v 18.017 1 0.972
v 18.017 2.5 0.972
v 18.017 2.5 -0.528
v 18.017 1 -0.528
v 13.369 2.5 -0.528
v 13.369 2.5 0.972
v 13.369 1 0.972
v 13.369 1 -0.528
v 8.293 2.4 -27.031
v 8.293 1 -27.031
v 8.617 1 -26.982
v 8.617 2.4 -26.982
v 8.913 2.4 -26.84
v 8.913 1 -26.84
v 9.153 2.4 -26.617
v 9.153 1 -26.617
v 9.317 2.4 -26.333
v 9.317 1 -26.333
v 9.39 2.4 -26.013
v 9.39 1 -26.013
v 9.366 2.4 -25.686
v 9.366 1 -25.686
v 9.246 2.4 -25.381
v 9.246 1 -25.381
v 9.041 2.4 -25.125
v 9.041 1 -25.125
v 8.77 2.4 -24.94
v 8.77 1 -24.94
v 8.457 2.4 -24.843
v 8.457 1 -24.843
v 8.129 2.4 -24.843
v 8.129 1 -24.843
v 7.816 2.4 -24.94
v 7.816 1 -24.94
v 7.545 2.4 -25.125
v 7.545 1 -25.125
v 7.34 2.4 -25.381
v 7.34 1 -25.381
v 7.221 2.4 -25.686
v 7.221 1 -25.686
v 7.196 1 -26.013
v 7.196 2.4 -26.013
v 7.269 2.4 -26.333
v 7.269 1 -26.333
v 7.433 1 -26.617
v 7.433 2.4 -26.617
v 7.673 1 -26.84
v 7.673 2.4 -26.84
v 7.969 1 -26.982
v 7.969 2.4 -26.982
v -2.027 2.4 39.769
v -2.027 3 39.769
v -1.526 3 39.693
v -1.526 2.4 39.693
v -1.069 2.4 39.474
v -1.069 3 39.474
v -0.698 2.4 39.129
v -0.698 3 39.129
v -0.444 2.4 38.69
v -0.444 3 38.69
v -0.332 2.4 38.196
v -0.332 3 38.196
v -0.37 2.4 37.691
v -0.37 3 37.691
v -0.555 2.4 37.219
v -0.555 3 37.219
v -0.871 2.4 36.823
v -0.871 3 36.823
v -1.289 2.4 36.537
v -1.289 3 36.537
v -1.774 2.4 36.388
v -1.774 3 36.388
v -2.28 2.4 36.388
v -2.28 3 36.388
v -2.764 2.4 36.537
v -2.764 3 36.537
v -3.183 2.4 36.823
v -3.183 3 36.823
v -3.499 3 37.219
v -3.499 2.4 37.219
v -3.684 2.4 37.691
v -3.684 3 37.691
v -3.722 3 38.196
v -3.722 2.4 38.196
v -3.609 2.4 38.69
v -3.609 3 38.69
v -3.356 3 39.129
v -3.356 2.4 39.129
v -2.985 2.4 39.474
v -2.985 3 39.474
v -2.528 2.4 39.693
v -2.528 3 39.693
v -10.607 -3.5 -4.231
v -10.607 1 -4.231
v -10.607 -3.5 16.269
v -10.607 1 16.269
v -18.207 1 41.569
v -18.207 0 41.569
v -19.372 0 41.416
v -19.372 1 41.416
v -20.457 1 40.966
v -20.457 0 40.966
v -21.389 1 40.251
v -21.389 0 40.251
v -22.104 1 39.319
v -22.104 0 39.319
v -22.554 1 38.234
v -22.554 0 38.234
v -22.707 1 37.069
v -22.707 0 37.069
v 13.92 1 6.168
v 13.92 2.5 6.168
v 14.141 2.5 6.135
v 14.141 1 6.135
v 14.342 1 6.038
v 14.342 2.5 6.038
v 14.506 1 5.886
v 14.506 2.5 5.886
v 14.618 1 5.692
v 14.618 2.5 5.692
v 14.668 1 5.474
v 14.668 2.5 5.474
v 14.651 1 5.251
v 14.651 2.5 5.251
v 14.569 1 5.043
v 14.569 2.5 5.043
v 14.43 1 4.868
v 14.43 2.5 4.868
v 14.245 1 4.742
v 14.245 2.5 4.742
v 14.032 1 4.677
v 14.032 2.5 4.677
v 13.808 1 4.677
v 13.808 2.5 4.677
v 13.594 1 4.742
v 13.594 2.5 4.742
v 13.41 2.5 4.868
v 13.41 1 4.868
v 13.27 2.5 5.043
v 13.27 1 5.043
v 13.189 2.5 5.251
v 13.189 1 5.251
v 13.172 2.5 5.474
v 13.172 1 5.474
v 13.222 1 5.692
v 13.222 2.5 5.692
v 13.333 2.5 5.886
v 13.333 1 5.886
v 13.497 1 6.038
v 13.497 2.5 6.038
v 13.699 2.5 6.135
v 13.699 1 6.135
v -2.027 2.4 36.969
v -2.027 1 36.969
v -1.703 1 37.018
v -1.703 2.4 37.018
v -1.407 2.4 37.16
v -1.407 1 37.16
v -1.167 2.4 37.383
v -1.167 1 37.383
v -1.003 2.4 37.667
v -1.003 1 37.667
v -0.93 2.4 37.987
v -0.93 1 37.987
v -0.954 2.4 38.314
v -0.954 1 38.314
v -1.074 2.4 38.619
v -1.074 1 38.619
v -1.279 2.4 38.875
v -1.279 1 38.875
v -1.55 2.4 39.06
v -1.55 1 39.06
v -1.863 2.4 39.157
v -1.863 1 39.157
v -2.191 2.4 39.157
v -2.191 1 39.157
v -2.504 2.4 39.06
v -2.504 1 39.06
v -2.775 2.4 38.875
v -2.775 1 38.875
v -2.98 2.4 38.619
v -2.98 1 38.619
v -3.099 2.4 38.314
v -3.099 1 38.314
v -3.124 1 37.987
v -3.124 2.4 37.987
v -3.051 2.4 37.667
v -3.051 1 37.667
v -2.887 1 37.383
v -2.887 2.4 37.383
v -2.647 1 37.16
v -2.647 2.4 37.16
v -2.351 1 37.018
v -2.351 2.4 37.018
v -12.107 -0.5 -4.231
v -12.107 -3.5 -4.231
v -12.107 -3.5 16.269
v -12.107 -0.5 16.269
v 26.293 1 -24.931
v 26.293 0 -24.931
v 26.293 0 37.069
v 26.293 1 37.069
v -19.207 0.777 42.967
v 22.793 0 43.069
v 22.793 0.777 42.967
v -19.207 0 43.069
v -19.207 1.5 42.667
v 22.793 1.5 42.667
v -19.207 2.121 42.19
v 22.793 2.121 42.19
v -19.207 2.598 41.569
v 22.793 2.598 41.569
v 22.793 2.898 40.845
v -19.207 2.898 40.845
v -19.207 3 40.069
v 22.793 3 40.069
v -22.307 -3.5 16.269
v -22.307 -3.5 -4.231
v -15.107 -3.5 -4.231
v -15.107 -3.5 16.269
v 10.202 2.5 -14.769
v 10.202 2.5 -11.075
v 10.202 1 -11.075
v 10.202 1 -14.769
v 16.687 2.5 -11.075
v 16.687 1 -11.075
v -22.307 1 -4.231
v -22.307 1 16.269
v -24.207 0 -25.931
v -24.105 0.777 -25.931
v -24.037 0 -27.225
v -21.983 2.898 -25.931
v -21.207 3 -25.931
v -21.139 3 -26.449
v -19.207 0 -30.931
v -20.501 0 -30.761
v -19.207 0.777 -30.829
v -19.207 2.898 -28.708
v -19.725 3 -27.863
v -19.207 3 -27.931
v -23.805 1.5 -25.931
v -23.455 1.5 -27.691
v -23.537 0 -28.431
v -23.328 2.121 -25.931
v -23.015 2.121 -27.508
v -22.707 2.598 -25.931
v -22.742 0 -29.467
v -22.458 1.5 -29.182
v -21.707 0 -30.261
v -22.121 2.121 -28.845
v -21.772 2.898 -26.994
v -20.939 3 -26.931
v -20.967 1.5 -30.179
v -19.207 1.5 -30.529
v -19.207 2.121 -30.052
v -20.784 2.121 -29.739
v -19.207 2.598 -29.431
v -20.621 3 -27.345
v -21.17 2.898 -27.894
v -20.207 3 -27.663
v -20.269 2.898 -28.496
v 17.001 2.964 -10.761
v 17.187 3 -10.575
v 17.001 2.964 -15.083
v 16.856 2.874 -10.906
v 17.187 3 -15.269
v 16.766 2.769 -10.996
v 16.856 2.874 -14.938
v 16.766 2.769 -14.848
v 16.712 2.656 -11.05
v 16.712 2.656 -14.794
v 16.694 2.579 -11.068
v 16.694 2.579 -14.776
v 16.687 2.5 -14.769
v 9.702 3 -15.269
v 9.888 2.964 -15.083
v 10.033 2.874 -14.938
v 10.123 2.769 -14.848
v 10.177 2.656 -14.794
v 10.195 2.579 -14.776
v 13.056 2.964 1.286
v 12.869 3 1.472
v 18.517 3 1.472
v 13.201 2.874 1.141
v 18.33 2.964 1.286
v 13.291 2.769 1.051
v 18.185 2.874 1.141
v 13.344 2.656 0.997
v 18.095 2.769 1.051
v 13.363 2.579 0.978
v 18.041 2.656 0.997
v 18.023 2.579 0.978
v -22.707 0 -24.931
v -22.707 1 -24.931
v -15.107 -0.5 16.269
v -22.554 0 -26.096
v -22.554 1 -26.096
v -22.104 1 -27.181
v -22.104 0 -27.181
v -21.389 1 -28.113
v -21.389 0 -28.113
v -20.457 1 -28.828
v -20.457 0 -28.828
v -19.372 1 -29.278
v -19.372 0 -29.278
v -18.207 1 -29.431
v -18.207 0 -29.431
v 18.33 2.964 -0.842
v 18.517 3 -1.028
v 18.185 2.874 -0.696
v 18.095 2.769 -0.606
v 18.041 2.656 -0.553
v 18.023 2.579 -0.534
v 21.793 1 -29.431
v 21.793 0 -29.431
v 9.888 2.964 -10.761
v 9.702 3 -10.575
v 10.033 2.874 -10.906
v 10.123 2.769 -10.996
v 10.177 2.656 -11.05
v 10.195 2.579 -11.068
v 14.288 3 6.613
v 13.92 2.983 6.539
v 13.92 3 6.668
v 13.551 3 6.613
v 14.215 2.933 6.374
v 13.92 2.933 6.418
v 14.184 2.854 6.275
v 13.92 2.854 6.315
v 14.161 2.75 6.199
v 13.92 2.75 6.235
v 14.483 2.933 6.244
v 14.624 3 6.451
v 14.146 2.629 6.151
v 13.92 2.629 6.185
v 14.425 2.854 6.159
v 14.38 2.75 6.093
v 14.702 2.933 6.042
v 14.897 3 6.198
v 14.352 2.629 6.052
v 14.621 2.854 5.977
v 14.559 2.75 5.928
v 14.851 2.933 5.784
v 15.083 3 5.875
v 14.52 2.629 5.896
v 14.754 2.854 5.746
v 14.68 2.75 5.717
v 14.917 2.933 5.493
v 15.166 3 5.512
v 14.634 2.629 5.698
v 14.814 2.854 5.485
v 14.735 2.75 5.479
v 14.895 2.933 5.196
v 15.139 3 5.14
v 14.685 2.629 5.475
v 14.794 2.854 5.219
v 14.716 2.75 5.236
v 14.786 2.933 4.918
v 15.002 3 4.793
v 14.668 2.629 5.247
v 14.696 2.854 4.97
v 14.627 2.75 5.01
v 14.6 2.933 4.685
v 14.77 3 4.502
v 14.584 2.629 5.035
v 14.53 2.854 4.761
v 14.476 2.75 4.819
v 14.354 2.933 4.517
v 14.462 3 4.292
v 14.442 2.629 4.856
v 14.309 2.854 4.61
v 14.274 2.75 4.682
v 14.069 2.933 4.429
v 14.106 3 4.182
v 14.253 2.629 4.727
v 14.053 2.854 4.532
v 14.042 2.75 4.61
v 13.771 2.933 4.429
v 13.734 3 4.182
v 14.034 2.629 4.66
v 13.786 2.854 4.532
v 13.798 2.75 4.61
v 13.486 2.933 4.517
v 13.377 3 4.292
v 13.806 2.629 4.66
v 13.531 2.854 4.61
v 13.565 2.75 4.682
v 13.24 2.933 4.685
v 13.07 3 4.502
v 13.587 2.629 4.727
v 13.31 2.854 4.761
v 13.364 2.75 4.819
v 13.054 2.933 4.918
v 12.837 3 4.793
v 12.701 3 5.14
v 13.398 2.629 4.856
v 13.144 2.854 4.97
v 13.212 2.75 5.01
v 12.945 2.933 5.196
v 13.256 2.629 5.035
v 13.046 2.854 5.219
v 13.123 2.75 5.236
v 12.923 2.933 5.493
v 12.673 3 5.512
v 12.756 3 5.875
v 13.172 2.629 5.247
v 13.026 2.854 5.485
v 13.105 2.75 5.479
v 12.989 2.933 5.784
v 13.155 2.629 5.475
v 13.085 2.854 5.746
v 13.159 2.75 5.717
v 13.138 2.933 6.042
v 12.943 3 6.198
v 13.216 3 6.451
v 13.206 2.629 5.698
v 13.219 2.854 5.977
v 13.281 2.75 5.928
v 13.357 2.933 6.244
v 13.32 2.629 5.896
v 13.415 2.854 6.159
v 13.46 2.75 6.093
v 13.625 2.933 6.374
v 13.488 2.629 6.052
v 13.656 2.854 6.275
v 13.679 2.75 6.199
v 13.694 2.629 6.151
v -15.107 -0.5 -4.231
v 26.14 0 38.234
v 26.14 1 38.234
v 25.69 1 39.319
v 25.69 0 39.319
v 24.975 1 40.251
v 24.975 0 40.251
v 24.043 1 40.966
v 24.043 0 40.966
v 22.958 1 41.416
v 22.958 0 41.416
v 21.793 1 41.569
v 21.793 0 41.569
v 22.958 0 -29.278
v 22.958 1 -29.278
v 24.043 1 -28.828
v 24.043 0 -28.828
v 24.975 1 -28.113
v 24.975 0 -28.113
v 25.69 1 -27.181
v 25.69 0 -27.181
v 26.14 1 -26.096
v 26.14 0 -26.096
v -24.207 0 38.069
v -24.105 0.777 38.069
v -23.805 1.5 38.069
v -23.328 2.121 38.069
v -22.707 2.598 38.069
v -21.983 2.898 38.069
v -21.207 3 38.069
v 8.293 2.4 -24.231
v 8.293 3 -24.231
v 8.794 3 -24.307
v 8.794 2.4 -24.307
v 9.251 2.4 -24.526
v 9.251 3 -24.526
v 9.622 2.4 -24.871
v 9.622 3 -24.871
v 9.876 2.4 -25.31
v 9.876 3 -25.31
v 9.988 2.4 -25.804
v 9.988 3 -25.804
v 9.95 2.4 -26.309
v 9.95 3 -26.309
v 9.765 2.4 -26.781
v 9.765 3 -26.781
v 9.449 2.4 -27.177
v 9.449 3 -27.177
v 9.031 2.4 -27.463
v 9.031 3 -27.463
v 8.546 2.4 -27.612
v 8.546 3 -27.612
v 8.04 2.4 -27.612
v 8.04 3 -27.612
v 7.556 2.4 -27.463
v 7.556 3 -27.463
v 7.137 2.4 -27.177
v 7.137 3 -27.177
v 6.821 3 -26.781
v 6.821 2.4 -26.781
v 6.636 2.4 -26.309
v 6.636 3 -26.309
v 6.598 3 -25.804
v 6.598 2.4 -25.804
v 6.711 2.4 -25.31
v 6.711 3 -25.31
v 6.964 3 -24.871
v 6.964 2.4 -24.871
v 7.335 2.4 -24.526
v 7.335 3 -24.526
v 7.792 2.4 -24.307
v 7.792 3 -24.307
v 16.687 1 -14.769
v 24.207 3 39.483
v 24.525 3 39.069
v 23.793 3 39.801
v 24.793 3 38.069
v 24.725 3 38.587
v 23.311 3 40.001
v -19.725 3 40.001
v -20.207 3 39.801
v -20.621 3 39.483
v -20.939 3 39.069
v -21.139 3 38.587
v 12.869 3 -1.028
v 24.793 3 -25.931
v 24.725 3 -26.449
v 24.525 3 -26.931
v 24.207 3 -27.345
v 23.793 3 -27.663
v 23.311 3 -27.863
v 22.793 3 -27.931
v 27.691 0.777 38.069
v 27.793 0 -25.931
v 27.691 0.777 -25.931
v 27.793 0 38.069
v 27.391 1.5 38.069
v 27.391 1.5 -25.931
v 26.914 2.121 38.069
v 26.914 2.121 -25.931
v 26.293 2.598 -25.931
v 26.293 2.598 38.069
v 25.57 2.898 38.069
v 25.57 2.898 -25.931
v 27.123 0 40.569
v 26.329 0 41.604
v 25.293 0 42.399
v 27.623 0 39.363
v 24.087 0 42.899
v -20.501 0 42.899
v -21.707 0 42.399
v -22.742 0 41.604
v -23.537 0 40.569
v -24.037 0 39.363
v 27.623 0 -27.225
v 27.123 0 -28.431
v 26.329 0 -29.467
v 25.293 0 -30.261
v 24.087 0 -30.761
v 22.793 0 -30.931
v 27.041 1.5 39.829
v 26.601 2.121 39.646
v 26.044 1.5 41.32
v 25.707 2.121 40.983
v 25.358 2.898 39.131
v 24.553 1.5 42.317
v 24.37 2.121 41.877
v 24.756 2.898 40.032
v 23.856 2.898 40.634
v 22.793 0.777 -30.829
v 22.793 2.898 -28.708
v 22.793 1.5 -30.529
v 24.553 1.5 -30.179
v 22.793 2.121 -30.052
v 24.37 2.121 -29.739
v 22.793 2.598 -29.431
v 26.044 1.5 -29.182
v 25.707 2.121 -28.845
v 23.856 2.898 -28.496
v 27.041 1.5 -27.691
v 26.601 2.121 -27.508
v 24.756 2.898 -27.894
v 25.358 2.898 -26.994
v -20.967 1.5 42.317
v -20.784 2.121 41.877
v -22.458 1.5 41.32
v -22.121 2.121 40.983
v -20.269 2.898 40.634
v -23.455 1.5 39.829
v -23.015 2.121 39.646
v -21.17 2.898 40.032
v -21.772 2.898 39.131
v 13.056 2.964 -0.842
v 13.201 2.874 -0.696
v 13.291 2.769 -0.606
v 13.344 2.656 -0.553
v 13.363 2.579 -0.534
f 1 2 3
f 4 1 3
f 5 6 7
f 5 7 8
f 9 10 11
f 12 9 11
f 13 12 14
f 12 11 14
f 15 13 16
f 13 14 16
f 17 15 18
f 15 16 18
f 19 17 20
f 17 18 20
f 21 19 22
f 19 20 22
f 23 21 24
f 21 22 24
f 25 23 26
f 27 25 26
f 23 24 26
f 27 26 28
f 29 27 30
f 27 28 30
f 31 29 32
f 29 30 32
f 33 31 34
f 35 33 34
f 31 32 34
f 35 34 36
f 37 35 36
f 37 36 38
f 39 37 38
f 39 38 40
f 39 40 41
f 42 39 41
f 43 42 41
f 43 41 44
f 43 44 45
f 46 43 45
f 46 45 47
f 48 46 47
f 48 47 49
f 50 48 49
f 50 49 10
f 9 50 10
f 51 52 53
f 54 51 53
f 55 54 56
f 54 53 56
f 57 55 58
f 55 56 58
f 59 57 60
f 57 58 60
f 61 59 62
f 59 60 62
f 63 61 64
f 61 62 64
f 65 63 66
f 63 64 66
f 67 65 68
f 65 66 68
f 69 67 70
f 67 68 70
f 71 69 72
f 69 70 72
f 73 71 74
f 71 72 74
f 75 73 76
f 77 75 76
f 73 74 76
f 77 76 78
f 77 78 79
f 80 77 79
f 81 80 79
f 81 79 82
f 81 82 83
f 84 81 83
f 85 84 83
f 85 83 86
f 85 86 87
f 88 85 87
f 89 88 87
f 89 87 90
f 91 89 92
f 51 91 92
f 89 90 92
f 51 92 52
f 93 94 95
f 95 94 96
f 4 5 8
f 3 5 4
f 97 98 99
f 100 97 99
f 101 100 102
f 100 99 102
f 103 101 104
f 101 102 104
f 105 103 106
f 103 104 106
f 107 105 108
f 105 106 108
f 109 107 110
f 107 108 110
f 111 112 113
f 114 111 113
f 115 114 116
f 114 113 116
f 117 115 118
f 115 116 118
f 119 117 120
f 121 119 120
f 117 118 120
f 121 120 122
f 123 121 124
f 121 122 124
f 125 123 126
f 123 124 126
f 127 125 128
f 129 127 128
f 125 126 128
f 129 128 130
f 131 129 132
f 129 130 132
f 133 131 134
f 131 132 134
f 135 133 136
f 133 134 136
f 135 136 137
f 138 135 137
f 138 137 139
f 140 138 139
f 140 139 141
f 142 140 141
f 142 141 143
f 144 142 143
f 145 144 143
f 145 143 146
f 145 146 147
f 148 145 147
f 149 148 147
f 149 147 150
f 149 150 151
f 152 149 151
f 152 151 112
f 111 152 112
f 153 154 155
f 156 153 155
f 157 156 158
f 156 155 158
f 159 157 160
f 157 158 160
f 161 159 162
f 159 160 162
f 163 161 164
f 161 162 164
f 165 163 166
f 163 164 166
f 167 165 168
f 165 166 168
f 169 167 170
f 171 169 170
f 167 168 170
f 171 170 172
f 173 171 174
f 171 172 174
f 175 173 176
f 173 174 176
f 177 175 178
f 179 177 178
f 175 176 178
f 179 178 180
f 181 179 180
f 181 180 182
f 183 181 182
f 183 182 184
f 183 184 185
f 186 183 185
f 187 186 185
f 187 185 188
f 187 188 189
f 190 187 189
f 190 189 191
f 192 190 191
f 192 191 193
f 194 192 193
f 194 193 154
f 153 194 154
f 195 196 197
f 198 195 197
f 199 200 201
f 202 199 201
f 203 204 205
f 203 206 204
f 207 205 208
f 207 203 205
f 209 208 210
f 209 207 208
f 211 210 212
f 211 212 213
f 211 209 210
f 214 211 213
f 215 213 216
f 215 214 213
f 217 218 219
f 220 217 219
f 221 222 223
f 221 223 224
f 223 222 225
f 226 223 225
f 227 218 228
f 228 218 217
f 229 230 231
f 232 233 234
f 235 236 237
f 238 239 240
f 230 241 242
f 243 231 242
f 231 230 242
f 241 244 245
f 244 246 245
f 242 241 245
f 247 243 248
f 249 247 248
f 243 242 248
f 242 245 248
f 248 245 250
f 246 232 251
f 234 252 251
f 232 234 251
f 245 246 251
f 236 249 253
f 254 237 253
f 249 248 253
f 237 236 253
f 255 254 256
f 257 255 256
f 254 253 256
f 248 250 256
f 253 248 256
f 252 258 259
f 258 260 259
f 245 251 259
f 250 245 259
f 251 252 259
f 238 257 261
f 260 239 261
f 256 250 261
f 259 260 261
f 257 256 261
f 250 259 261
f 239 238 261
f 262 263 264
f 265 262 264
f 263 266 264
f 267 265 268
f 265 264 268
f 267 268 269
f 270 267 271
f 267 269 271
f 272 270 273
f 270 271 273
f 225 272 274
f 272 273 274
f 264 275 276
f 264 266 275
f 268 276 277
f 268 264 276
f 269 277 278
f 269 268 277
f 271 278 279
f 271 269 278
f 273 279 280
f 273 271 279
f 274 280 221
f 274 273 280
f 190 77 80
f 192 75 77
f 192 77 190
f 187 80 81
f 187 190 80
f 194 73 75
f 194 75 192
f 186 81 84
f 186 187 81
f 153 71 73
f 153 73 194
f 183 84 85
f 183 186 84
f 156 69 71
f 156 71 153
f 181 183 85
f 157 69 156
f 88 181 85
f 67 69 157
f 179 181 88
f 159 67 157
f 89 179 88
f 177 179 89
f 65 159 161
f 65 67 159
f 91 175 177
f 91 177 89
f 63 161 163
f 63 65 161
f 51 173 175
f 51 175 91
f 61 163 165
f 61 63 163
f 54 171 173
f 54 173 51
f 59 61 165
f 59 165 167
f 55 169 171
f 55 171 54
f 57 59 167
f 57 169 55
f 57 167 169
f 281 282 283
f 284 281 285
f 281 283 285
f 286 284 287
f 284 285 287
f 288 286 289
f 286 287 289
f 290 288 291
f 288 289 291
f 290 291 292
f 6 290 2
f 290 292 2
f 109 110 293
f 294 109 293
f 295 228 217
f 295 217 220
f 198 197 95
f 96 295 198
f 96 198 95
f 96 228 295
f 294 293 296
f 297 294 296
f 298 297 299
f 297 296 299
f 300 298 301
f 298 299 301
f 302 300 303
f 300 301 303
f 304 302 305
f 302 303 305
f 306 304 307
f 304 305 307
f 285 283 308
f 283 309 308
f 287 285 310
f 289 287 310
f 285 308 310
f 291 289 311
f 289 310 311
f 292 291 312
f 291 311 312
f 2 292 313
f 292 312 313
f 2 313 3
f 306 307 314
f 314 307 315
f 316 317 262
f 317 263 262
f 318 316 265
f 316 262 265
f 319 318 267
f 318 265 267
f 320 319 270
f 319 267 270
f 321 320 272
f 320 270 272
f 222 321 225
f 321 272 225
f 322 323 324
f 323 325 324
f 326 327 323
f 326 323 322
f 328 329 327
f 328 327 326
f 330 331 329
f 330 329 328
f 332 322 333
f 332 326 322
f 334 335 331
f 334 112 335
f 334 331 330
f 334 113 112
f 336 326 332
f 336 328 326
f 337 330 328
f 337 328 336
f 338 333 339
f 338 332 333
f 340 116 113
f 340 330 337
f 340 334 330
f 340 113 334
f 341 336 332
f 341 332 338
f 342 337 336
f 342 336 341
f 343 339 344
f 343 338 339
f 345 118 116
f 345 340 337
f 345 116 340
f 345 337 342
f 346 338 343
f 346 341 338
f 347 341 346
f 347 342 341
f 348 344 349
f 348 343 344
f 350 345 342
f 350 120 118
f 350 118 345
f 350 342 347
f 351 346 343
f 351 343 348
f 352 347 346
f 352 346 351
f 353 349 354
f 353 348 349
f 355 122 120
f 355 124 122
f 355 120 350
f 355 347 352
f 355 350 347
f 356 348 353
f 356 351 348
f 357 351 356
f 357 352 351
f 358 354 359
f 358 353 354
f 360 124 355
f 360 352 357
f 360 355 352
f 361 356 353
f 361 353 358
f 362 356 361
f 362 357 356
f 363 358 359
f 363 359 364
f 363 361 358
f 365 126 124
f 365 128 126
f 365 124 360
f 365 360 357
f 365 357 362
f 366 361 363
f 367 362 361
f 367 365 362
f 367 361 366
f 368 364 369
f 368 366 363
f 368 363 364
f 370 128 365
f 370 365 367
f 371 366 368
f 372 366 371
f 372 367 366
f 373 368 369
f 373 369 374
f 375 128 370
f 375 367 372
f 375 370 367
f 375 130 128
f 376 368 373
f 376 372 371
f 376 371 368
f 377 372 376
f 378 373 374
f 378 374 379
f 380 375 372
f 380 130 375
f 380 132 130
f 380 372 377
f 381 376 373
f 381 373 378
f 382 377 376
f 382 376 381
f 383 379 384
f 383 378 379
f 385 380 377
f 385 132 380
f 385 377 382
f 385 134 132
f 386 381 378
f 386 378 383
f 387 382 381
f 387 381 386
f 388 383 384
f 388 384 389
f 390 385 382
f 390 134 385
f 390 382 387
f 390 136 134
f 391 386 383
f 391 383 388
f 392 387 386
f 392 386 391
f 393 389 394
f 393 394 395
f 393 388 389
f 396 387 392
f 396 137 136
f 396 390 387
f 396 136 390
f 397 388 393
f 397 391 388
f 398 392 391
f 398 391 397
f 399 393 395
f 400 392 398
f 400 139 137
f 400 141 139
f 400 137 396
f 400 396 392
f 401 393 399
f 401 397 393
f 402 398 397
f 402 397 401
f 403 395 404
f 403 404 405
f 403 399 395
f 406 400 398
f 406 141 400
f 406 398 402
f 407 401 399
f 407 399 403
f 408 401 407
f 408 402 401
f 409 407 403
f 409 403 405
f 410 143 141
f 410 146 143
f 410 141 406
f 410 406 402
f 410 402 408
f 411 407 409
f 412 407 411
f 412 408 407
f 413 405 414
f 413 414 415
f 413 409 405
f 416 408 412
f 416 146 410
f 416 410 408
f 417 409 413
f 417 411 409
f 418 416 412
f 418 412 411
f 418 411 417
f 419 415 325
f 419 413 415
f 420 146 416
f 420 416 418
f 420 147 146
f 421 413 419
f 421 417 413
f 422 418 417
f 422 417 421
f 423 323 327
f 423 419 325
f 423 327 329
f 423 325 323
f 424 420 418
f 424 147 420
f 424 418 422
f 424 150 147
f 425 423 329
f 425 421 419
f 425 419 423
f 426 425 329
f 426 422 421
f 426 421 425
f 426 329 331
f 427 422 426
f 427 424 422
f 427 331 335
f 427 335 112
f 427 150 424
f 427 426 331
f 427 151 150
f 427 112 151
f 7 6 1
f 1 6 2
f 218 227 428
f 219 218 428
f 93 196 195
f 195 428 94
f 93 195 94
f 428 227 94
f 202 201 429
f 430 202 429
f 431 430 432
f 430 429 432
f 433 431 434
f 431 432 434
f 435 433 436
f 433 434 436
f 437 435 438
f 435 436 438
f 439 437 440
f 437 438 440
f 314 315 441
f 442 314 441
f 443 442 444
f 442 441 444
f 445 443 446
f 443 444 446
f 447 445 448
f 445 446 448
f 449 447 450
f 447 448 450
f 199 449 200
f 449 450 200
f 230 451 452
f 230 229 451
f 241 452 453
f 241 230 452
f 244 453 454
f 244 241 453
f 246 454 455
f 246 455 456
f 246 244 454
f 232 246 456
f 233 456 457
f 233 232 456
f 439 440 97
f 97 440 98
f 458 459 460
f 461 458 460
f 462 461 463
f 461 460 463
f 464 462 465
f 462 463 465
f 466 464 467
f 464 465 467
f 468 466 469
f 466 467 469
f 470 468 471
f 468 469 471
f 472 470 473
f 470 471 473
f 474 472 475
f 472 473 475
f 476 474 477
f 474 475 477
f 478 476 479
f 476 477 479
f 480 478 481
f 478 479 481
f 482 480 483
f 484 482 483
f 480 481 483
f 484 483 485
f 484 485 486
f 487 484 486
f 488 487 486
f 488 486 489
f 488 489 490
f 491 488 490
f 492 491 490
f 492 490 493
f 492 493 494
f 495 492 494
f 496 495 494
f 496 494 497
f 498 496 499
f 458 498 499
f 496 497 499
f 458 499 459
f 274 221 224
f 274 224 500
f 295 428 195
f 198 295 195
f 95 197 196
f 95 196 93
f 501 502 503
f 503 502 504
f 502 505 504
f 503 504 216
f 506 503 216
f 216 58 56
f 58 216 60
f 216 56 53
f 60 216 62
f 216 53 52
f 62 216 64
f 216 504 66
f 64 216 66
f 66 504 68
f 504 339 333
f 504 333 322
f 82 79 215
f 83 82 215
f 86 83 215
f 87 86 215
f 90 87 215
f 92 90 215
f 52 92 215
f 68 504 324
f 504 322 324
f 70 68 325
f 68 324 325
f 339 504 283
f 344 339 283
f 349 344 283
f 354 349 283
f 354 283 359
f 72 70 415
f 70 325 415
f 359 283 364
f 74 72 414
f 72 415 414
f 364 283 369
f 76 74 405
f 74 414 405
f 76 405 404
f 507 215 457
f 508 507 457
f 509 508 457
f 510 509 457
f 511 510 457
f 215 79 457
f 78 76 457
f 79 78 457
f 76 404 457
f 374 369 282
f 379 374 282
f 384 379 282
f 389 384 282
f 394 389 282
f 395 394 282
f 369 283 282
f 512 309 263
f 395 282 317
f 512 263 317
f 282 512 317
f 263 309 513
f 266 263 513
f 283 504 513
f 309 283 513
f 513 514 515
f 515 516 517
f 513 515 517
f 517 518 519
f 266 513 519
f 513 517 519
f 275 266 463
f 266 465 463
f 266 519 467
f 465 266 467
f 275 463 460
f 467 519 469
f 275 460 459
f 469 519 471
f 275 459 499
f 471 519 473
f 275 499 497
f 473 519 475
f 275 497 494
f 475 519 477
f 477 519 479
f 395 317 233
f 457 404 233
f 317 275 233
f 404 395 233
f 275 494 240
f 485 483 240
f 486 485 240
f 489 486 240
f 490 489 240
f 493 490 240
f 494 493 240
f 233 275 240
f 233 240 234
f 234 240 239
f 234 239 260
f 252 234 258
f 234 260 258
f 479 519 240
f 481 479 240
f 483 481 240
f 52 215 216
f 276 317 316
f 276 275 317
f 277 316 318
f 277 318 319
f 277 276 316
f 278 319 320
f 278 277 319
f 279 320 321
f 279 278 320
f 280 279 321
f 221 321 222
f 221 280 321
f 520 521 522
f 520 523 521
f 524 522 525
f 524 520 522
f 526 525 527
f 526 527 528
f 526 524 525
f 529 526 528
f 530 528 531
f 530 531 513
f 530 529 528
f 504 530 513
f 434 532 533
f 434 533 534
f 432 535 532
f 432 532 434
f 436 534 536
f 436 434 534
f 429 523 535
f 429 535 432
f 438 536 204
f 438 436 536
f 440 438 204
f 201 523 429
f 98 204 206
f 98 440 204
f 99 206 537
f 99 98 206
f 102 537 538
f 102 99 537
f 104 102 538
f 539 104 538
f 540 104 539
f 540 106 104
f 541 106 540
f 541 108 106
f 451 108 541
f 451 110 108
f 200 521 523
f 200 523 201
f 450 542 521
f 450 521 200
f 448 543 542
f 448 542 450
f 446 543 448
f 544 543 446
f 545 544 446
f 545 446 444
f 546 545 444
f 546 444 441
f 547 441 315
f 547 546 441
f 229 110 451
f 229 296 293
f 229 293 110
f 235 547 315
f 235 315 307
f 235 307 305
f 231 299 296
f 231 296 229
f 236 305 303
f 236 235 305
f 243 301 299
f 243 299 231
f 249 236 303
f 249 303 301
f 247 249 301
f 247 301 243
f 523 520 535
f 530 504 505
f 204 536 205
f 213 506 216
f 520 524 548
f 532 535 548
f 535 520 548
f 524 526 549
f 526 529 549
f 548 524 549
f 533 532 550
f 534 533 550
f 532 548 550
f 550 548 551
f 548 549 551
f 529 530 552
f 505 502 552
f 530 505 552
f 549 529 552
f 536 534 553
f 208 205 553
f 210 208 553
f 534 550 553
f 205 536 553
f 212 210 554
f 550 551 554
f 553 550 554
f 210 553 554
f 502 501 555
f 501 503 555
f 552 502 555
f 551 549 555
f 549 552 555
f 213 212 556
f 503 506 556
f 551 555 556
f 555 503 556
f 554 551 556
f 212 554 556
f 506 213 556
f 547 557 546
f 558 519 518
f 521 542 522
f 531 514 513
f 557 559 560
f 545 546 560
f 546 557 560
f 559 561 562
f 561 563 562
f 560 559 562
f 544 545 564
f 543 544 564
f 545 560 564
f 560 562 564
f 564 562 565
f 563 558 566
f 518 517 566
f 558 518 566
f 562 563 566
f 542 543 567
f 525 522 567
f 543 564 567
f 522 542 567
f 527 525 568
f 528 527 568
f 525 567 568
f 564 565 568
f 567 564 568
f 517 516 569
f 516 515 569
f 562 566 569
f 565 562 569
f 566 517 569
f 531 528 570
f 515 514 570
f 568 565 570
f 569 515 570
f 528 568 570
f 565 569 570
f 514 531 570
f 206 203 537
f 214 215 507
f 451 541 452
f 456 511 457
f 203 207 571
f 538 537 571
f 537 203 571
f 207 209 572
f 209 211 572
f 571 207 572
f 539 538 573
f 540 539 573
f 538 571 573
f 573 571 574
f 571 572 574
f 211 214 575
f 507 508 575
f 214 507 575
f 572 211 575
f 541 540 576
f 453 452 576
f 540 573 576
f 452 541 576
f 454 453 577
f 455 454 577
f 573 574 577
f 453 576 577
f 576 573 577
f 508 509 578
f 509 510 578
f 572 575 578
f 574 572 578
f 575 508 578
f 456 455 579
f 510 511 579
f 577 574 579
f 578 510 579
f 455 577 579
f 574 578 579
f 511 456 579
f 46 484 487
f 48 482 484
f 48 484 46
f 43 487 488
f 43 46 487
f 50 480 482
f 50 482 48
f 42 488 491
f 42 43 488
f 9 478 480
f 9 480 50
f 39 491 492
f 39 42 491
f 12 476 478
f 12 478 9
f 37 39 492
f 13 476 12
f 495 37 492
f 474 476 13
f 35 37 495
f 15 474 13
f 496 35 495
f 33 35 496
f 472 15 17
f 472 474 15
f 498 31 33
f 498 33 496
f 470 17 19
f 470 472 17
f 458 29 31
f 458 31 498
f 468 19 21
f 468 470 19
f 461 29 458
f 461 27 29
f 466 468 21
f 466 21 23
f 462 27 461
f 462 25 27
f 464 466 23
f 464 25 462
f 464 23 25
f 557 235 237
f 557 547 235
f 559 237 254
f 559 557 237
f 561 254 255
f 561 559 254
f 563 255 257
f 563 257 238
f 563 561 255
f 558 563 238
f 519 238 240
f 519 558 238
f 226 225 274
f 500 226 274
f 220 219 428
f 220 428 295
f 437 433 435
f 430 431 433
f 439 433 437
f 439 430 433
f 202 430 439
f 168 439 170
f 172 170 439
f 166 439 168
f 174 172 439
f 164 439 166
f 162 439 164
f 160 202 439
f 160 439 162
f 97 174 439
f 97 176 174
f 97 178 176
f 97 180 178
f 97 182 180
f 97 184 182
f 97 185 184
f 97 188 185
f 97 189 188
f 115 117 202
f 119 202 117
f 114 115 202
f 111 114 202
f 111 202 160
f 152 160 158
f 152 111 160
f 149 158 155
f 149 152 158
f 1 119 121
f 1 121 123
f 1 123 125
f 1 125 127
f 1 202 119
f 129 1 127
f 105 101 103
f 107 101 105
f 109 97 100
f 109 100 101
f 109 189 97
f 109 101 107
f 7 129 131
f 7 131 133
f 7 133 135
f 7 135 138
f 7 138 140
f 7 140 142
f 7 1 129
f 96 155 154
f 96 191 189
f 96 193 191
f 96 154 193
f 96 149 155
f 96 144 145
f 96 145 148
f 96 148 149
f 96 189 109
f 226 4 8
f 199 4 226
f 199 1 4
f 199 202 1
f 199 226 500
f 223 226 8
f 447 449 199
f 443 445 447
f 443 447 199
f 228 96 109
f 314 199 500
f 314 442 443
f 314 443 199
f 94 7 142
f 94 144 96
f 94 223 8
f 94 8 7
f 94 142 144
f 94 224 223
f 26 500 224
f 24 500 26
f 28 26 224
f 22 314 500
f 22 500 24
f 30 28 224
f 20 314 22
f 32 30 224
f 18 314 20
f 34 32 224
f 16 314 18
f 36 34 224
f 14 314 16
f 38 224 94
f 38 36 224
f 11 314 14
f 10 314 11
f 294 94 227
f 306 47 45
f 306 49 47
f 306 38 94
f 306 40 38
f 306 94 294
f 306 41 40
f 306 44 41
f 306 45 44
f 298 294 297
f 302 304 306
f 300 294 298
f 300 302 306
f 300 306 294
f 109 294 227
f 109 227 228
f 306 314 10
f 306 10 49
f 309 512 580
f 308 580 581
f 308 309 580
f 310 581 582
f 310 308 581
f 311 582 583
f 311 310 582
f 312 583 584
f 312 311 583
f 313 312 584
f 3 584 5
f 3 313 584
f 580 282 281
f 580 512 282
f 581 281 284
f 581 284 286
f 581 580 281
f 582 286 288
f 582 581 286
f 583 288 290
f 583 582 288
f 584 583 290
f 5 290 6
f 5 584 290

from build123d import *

# Parameters (mm, degrees)
BOSS_EXTRUDE1_DEPTH = 3
CUT_EXTRUDE1_DEPTH  = 1
FILLET1_R           = 3
SKETCH6_W           = 12
SKETCH6_H           = 20.5
BOSS_EXTRUDE3_DEPTH = 4.5
SKETCH28_W          = 0.3
SKETCH28_H          = 20.5
CUT_EXTRUDE18_DEPTH = 4.5
SKETCH44_R          = 1.1
CUT_EXTRUDE26_DEPTH = 10
SKETCH45_R          = 1.1
CUT_EXTRUDE27_DEPTH = 10
SKETCH47_R          = 1.7
CUT_EXTRUDE29_DEPTH = 0.6
SKETCH13_W          = 3
SKETCH13_H          = 20.5
CUT_EXTRUDE30_DEPTH = 3
SKETCH49_W          = 6.485663297
SKETCH49_H          = 3.694682329
CUT_EXTRUDE31_DEPTH = 8
SKETCH48_R          = 0.75
SKETCH48_W          = 4.647178446
SKETCH48_H          = 1.5
CUT_EXTRUDE33_DEPTH = 8
FILLET2_R           = 0.5
BOSS_EXTRUDE4_DEPTH = 1


with BuildPart() as part:
    # Sketch1 → Boss-Extrude1 (new body)
    with BuildSketch(Plane(origin=(0, 0, 0), x_dir=(1, 0, 0), z_dir=(0, 1, 0))):
        with BuildLine():
            Line((-19.206896552, 30.931034483), (22.793103448, 30.931034483))
            ThreePointArc((22.793103448, 30.931034483), (26.328637354, 29.466568389), (27.793103448, 25.931034483))
            Line((27.793103448, 25.931034483), (27.793103448, -38.068965517))
            ThreePointArc((27.793103448, -38.068965517), (26.328637354, -41.604499423), (22.793103448, -43.068965517))
            Line((22.793103448, -43.068965517), (-19.206896552, -43.068965517))
            ThreePointArc((-19.206896552, -43.068965517), (-22.742430458, -41.604499423), (-24.206896552, -38.068965517))
            Line((-24.206896552, -38.068965517), (-24.206896552, 25.931034483))
            ThreePointArc((-24.206896552, 25.931034483), (-22.742430458, 29.466568389), (-19.206896552, 30.931034483))
        make_face()
    extrude(amount=BOSS_EXTRUDE1_DEPTH)

    # Sketch3 → Cut-Extrude1 (cut)
    with BuildSketch(Plane(origin=(0, 0, 0), x_dir=(-1, 0, 0), z_dir=(0, -1, 0))):
        with BuildLine():
            Line((18.206896552, 29.931034483), (-21.793103448, 29.931034483))
            ThreePointArc((-21.793103448, 29.931034483), (-25.328637354, 28.466568389), (-26.793103448, 24.931034483))
            Line((-26.793103448, 24.931034483), (-26.793103448, -37.068965517))
            ThreePointArc((-26.793103448, -37.068965517), (-25.328637354, -40.604499423), (-21.793103448, -42.068965517))
            Line((-21.793103448, -42.068965517), (18.206896552, -42.068965517))
            ThreePointArc((18.206896552, -42.068965517), (21.742430458, -40.604499423), (23.206896552, -37.068965517))
            Line((23.206896552, -37.068965517), (23.206896552, 24.931034483))
            ThreePointArc((23.206896552, 24.931034483), (21.742430458, 28.466568389), (18.206896552, 29.931034483))
        make_face()
    extrude(amount=-CUT_EXTRUDE1_DEPTH, mode=Mode.SUBTRACT)

    # Fillet1
    fillet1_edges = [part.edges().sort_by_distance(p)[0] for p in [
        (-22.742430458, 3, -29.466568389),
        (1.793103448, 3, -30.931034483),
        (26.328637354, 3, -29.466568389),
        (27.793103448, 3, 6.068965517),
        (26.328637354, 3, 41.604499423),
        (1.793103448, 3, 43.068965517),
        (-22.742430458, 3, 41.604499423),
        (-24.206896552, 3, 6.068965517),
    ]]
    fillet(fillet1_edges, radius=FILLET1_R - 0.0001)  # a hair under: the kernel refuses the full size

    # Sketch6 → Boss-Extrude3 (add)
    with BuildSketch(Plane.XZ.offset(-1)):
        with Locations((-16.606896552, 6.018965517)):
            Rectangle(SKETCH6_W, SKETCH6_H)
    extrude(amount=BOSS_EXTRUDE3_DEPTH)

    # Sketch28 → Cut-Extrude18 (cut)
    with BuildSketch(Plane.XZ.offset(3.5)):
        with Locations((-22.456896552, 6.018965517)):
            Rectangle(SKETCH28_W, SKETCH28_H)
    extrude(amount=-CUT_EXTRUDE18_DEPTH, mode=Mode.SUBTRACT)

    # Sketch44 → Cut-Extrude26 (cut)
    with BuildSketch(Plane.XZ.offset(-1)):
        with Locations(Location((-2.026896552, 38.068965517, 0), (0, 0, 270))):
            Circle(SKETCH44_R)
    extrude(amount=-CUT_EXTRUDE26_DEPTH, mode=Mode.SUBTRACT)

    # Sketch45 → Cut-Extrude27 (cut)
    with BuildSketch(Plane.XZ.offset(-1)):
        with Locations(Location((8.293103448, -25.931034483, 0), (0, 0, 270))):
            Circle(SKETCH45_R)
    extrude(amount=-CUT_EXTRUDE27_DEPTH, mode=Mode.SUBTRACT)

    # Sketch47 → Cut-Extrude29 (cut)
    with BuildSketch(Plane(origin=(0, 3, 0), x_dir=(1, 0, 0), z_dir=(0, 1, 0))):
        with Locations(Location((8.293103448, 25.931034483, 0), (0, 0, 270))):
            Circle(SKETCH47_R)
        with Locations(Location((-2.026896552, -38.068965517, 0), (0, 0, 270))):
            Circle(SKETCH47_R)
    extrude(amount=-CUT_EXTRUDE29_DEPTH, mode=Mode.SUBTRACT)

    # Sketch13 → Cut-Extrude30 (cut)
    with BuildSketch(Plane.XZ.offset(3.5)):
        with Locations((-13.606896552, 6.018965517)):
            Rectangle(SKETCH13_W, SKETCH13_H)
    extrude(amount=-CUT_EXTRUDE30_DEPTH, mode=Mode.SUBTRACT)

    # Sketch49 → Cut-Extrude31 (cut)
    with BuildSketch(Plane(origin=(0, 3, 0), x_dir=(1, 0, 0), z_dir=(0, 1, 0))):
        with Locations((13.444488672, 12.922014382)):
            Rectangle(SKETCH49_W, SKETCH49_H)
    extrude(amount=-CUT_EXTRUDE31_DEPTH, mode=Mode.SUBTRACT)

    # Sketch48 → Cut-Extrude33 (cut)
    with BuildSketch(Plane(origin=(0, 3, 0), x_dir=(1, 0, 0), z_dir=(0, 1, 0))):
        with Locations(Location((13.919849349, -5.418160984, 0), (0, 0, 270))):
            Circle(SKETCH48_R)
        with Locations((15.692920165, -0.222236134)):
            Rectangle(SKETCH48_W, SKETCH48_H)
    extrude(amount=-CUT_EXTRUDE33_DEPTH, mode=Mode.SUBTRACT)

    # Fillet2
    fillet2_edges = [part.edges().sort_by_distance(p)[0] for p in [
        (10.201657023, 3, -12.922014382),
        (13.444488671, 3, -11.074673217),
        (16.68732032, 3, -12.922014382),
        (13.444488671, 3, -14.769355546),
        (13.369330942, 3, 0.222236134),
        (15.692920165, 3, 0.972236134),
        (18.016509388, 3, 0.222236134),
        (15.692920165, 3, -0.527763866),
        (13.919849349, 3, 4.668160984),
    ]]
    fillet(fillet2_edges, radius=FILLET2_R)

    # Sketch51 → Boss-Extrude4 (add)
    with BuildSketch(Plane(origin=(0, 0, 0), x_dir=(1, 0, 0), z_dir=(0, 1, 0))):
        with BuildLine():
            Line((26.793103448, 24.931034483), (26.793103448, -37.068965517))
            ThreePointArc((26.793103448, -37.068965517), (25.328637354, -40.604499423), (21.793103448, -42.068965517))
            Line((21.793103448, -42.068965517), (-18.206896552, -42.068965517))
            ThreePointArc((-18.206896552, -42.068965517), (-21.742430458, -40.604499423), (-23.206896552, -37.068965517))
            Line((-23.206896552, -37.068965517), (-23.206896552, 24.931034483))
            ThreePointArc((-23.206896552, 24.931034483), (-21.742430458, 28.466568389), (-18.206896552, 29.931034483))
            Line((-18.206896552, 29.931034483), (21.793103448, 29.931034483))
            ThreePointArc((21.793103448, 29.931034483), (25.328637354, 28.466568389), (26.793103448, 24.931034483))
        make_face()
        with BuildLine():
            Line((21.793103448, -41.568965517), (-18.206896552, -41.568965517))
            ThreePointArc((-18.206896552, -41.568965517), (-21.388877067, -40.250946033), (-22.706896552, -37.068965517))
            Line((-22.706896552, -37.068965517), (-22.706896552, 24.931034483))
            ThreePointArc((-22.706896552, 24.931034483), (-21.388877067, 28.113014998), (-18.206896552, 29.431034483))
            Line((-18.206896552, 29.431034483), (21.793103448, 29.431034483))
            ThreePointArc((21.793103448, 29.431034483), (24.975083964, 28.113014998), (26.293103448, 24.931034483))
            Line((26.293103448, 24.931034483), (26.293103448, -37.068965517))
            ThreePointArc((26.293103448, -37.068965517), (24.975083964, -40.250946033), (21.793103448, -41.568965517))
        make_face(mode=Mode.SUBTRACT)
    extrude(amount=BOSS_EXTRUDE4_DEPTH)


solid = part.part
